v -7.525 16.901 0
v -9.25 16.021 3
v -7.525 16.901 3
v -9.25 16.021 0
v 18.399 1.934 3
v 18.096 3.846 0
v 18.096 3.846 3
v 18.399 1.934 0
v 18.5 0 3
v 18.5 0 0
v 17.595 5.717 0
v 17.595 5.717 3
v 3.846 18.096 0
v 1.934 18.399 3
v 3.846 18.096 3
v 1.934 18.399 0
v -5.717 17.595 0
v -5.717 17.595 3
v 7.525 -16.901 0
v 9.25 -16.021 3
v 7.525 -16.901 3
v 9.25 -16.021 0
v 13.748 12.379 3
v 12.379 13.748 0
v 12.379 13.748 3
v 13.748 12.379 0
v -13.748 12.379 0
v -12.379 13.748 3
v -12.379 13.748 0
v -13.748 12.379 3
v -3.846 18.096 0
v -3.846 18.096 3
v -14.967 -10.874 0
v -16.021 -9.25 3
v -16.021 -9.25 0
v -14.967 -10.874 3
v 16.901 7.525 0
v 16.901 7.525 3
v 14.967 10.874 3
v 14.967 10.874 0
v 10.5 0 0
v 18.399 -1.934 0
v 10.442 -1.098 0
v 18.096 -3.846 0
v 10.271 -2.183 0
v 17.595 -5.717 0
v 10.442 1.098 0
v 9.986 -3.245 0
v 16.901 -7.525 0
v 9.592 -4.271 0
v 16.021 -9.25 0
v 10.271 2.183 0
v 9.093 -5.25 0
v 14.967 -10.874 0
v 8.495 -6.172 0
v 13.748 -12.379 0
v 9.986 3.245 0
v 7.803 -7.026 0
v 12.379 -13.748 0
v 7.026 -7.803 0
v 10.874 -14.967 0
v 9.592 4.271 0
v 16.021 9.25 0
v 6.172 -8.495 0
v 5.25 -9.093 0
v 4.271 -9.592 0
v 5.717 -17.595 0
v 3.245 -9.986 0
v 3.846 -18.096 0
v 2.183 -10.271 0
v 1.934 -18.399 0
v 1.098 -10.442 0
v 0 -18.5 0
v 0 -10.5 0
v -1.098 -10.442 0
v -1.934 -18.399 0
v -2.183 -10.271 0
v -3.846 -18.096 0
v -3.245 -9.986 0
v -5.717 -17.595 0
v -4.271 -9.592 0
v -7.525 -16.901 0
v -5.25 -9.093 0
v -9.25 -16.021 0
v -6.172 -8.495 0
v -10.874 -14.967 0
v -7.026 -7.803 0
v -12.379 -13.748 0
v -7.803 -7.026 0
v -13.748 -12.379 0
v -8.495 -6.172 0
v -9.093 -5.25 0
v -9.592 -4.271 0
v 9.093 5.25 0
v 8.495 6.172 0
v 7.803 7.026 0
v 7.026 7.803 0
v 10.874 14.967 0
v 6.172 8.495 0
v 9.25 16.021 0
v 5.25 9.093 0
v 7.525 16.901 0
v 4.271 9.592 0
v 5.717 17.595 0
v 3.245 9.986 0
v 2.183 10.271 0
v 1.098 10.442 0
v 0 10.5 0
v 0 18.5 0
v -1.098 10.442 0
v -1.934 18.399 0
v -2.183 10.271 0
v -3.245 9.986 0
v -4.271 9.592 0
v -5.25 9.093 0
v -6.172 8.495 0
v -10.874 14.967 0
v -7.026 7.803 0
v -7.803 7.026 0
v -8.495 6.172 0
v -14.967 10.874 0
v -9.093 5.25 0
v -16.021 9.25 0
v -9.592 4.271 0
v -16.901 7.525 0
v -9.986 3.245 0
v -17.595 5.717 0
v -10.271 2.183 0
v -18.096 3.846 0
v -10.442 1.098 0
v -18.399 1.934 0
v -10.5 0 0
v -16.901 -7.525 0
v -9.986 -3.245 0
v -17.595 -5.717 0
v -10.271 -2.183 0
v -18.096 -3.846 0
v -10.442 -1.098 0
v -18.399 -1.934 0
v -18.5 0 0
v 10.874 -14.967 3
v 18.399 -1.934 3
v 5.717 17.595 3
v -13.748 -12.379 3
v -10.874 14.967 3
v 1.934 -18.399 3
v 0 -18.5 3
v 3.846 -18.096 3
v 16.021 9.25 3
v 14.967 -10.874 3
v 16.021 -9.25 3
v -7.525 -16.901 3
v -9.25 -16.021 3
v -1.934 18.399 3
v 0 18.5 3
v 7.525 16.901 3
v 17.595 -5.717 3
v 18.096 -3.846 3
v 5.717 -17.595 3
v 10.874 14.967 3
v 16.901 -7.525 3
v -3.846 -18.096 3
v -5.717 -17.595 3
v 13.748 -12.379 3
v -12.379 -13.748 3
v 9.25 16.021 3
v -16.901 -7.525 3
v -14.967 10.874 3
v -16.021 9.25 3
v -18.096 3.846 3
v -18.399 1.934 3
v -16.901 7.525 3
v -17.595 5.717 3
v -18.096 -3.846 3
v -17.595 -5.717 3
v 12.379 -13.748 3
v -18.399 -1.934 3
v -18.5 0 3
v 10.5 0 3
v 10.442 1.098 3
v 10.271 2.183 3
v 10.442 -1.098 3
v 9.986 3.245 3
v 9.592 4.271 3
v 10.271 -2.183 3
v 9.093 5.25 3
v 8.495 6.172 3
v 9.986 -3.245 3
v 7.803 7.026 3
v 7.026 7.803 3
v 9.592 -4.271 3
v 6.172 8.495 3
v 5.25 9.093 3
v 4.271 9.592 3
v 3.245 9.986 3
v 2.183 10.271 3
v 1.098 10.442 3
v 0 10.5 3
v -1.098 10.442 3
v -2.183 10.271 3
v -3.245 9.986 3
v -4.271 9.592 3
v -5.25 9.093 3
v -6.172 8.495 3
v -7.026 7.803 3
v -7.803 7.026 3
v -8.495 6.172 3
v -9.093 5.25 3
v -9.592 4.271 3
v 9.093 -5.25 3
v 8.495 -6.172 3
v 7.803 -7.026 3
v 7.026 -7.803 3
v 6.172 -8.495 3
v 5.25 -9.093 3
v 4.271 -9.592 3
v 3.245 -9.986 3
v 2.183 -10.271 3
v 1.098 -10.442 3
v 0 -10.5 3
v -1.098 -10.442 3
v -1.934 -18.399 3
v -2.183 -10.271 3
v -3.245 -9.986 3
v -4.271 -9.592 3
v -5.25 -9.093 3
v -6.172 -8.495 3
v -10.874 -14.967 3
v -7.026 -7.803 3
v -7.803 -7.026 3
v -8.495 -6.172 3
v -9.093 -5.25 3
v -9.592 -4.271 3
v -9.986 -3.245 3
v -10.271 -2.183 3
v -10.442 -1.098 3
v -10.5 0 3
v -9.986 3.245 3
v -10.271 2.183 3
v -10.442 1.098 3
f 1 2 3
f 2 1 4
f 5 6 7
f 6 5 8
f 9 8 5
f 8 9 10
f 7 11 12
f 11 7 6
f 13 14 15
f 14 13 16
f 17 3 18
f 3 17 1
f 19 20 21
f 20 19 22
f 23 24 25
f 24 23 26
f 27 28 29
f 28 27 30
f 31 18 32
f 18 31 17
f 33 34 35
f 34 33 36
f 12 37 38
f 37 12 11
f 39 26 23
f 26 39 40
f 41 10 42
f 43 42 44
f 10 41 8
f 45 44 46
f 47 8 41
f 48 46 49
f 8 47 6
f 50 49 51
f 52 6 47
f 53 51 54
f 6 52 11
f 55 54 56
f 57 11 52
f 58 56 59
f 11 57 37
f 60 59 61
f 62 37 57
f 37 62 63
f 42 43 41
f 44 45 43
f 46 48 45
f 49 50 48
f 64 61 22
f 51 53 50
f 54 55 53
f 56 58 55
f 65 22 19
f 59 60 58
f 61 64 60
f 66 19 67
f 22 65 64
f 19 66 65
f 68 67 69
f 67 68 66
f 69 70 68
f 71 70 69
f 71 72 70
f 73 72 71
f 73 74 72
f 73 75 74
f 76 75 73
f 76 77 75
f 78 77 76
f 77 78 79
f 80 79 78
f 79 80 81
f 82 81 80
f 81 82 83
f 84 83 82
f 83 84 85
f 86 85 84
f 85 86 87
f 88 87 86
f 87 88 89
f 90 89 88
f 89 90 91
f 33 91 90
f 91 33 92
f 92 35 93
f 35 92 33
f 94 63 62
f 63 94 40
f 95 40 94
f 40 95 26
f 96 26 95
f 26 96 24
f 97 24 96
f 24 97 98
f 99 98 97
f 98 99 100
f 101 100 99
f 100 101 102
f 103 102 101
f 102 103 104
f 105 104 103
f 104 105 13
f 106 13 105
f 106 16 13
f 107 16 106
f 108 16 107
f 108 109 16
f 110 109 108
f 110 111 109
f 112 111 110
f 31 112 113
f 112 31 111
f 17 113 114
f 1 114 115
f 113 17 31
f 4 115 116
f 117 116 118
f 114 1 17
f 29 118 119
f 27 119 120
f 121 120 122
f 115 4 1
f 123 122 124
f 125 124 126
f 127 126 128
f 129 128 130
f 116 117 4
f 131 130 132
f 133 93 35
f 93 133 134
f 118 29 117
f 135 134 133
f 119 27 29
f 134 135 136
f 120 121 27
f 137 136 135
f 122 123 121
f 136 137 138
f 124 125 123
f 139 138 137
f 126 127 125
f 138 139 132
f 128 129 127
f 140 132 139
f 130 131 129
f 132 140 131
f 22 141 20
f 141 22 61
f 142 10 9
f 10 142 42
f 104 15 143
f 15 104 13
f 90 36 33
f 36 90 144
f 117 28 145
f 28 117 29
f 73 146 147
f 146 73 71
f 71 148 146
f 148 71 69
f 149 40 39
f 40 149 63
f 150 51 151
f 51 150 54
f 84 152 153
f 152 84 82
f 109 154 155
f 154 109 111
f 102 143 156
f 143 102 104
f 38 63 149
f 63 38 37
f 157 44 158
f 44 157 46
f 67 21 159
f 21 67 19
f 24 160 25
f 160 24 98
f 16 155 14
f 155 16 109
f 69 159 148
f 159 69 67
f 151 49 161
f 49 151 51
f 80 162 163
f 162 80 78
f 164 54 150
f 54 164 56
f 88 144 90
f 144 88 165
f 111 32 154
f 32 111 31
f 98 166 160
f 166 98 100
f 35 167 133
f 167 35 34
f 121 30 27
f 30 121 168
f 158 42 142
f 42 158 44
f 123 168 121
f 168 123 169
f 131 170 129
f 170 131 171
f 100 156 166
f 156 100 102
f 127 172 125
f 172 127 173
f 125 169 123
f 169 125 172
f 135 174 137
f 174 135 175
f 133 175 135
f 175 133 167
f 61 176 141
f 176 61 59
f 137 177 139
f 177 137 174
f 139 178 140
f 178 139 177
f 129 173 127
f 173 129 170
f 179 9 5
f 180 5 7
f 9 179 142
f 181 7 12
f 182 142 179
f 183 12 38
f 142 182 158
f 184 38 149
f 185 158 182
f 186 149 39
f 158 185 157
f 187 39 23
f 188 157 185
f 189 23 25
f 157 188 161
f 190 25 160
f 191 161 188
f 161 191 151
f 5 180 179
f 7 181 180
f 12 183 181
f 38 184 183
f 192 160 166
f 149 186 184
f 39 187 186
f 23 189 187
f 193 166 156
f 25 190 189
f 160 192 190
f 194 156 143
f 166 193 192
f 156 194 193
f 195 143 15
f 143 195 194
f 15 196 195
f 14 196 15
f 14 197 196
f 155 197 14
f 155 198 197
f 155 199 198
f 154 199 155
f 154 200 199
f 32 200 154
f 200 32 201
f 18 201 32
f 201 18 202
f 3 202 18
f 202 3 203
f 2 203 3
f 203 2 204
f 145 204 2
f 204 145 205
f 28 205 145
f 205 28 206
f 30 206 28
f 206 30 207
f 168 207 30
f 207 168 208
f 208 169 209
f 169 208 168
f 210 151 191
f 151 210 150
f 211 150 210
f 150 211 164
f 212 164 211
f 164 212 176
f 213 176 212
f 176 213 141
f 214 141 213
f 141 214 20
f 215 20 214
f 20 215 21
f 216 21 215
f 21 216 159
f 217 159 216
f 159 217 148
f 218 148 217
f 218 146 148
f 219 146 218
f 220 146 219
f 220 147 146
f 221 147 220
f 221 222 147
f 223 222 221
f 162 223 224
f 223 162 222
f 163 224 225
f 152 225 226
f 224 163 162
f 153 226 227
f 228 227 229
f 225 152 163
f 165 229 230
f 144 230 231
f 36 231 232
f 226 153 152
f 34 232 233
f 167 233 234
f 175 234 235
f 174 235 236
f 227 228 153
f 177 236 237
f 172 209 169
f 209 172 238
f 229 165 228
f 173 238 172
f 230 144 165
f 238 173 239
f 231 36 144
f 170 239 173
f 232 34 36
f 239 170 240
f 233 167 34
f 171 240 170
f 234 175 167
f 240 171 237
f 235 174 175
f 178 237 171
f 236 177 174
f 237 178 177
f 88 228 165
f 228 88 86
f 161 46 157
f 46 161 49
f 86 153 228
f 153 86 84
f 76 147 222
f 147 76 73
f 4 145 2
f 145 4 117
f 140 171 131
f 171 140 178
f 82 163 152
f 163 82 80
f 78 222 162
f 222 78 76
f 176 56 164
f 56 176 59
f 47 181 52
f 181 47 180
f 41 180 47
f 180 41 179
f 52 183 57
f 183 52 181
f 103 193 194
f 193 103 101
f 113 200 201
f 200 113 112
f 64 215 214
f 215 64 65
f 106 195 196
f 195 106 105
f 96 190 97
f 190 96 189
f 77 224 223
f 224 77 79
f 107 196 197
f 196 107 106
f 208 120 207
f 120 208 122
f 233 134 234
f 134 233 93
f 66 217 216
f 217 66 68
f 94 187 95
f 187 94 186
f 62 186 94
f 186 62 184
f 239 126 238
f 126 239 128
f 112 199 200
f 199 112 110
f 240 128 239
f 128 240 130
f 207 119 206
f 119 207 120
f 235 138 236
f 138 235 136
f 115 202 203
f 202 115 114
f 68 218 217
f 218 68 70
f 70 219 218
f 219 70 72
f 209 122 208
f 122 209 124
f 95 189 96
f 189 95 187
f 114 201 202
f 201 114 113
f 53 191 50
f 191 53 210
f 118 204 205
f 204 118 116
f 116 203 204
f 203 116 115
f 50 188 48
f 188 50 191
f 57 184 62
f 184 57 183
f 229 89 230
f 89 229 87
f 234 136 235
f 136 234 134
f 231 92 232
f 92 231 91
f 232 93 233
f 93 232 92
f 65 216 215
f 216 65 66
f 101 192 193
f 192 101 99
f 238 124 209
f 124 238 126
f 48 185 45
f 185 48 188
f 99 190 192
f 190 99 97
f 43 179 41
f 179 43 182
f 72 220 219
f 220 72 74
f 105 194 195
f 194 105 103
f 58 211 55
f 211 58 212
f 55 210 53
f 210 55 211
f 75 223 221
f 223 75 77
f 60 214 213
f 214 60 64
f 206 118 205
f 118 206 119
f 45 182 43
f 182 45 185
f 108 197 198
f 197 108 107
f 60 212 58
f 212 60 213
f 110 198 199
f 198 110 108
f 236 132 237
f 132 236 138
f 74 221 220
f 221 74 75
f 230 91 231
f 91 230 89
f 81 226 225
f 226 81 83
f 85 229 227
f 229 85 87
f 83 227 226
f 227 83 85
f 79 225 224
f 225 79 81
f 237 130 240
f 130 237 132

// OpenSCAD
// Flat metric washer.
$fn = 60;
eps = 0.02;
inner_d = 21;
outer_d = 37;
thickness = 3;
difference() {
    cylinder(d = outer_d, h = thickness);
    translate([0, 0, -eps]) cylinder(d = inner_d, h = thickness + 2 * eps);
}
